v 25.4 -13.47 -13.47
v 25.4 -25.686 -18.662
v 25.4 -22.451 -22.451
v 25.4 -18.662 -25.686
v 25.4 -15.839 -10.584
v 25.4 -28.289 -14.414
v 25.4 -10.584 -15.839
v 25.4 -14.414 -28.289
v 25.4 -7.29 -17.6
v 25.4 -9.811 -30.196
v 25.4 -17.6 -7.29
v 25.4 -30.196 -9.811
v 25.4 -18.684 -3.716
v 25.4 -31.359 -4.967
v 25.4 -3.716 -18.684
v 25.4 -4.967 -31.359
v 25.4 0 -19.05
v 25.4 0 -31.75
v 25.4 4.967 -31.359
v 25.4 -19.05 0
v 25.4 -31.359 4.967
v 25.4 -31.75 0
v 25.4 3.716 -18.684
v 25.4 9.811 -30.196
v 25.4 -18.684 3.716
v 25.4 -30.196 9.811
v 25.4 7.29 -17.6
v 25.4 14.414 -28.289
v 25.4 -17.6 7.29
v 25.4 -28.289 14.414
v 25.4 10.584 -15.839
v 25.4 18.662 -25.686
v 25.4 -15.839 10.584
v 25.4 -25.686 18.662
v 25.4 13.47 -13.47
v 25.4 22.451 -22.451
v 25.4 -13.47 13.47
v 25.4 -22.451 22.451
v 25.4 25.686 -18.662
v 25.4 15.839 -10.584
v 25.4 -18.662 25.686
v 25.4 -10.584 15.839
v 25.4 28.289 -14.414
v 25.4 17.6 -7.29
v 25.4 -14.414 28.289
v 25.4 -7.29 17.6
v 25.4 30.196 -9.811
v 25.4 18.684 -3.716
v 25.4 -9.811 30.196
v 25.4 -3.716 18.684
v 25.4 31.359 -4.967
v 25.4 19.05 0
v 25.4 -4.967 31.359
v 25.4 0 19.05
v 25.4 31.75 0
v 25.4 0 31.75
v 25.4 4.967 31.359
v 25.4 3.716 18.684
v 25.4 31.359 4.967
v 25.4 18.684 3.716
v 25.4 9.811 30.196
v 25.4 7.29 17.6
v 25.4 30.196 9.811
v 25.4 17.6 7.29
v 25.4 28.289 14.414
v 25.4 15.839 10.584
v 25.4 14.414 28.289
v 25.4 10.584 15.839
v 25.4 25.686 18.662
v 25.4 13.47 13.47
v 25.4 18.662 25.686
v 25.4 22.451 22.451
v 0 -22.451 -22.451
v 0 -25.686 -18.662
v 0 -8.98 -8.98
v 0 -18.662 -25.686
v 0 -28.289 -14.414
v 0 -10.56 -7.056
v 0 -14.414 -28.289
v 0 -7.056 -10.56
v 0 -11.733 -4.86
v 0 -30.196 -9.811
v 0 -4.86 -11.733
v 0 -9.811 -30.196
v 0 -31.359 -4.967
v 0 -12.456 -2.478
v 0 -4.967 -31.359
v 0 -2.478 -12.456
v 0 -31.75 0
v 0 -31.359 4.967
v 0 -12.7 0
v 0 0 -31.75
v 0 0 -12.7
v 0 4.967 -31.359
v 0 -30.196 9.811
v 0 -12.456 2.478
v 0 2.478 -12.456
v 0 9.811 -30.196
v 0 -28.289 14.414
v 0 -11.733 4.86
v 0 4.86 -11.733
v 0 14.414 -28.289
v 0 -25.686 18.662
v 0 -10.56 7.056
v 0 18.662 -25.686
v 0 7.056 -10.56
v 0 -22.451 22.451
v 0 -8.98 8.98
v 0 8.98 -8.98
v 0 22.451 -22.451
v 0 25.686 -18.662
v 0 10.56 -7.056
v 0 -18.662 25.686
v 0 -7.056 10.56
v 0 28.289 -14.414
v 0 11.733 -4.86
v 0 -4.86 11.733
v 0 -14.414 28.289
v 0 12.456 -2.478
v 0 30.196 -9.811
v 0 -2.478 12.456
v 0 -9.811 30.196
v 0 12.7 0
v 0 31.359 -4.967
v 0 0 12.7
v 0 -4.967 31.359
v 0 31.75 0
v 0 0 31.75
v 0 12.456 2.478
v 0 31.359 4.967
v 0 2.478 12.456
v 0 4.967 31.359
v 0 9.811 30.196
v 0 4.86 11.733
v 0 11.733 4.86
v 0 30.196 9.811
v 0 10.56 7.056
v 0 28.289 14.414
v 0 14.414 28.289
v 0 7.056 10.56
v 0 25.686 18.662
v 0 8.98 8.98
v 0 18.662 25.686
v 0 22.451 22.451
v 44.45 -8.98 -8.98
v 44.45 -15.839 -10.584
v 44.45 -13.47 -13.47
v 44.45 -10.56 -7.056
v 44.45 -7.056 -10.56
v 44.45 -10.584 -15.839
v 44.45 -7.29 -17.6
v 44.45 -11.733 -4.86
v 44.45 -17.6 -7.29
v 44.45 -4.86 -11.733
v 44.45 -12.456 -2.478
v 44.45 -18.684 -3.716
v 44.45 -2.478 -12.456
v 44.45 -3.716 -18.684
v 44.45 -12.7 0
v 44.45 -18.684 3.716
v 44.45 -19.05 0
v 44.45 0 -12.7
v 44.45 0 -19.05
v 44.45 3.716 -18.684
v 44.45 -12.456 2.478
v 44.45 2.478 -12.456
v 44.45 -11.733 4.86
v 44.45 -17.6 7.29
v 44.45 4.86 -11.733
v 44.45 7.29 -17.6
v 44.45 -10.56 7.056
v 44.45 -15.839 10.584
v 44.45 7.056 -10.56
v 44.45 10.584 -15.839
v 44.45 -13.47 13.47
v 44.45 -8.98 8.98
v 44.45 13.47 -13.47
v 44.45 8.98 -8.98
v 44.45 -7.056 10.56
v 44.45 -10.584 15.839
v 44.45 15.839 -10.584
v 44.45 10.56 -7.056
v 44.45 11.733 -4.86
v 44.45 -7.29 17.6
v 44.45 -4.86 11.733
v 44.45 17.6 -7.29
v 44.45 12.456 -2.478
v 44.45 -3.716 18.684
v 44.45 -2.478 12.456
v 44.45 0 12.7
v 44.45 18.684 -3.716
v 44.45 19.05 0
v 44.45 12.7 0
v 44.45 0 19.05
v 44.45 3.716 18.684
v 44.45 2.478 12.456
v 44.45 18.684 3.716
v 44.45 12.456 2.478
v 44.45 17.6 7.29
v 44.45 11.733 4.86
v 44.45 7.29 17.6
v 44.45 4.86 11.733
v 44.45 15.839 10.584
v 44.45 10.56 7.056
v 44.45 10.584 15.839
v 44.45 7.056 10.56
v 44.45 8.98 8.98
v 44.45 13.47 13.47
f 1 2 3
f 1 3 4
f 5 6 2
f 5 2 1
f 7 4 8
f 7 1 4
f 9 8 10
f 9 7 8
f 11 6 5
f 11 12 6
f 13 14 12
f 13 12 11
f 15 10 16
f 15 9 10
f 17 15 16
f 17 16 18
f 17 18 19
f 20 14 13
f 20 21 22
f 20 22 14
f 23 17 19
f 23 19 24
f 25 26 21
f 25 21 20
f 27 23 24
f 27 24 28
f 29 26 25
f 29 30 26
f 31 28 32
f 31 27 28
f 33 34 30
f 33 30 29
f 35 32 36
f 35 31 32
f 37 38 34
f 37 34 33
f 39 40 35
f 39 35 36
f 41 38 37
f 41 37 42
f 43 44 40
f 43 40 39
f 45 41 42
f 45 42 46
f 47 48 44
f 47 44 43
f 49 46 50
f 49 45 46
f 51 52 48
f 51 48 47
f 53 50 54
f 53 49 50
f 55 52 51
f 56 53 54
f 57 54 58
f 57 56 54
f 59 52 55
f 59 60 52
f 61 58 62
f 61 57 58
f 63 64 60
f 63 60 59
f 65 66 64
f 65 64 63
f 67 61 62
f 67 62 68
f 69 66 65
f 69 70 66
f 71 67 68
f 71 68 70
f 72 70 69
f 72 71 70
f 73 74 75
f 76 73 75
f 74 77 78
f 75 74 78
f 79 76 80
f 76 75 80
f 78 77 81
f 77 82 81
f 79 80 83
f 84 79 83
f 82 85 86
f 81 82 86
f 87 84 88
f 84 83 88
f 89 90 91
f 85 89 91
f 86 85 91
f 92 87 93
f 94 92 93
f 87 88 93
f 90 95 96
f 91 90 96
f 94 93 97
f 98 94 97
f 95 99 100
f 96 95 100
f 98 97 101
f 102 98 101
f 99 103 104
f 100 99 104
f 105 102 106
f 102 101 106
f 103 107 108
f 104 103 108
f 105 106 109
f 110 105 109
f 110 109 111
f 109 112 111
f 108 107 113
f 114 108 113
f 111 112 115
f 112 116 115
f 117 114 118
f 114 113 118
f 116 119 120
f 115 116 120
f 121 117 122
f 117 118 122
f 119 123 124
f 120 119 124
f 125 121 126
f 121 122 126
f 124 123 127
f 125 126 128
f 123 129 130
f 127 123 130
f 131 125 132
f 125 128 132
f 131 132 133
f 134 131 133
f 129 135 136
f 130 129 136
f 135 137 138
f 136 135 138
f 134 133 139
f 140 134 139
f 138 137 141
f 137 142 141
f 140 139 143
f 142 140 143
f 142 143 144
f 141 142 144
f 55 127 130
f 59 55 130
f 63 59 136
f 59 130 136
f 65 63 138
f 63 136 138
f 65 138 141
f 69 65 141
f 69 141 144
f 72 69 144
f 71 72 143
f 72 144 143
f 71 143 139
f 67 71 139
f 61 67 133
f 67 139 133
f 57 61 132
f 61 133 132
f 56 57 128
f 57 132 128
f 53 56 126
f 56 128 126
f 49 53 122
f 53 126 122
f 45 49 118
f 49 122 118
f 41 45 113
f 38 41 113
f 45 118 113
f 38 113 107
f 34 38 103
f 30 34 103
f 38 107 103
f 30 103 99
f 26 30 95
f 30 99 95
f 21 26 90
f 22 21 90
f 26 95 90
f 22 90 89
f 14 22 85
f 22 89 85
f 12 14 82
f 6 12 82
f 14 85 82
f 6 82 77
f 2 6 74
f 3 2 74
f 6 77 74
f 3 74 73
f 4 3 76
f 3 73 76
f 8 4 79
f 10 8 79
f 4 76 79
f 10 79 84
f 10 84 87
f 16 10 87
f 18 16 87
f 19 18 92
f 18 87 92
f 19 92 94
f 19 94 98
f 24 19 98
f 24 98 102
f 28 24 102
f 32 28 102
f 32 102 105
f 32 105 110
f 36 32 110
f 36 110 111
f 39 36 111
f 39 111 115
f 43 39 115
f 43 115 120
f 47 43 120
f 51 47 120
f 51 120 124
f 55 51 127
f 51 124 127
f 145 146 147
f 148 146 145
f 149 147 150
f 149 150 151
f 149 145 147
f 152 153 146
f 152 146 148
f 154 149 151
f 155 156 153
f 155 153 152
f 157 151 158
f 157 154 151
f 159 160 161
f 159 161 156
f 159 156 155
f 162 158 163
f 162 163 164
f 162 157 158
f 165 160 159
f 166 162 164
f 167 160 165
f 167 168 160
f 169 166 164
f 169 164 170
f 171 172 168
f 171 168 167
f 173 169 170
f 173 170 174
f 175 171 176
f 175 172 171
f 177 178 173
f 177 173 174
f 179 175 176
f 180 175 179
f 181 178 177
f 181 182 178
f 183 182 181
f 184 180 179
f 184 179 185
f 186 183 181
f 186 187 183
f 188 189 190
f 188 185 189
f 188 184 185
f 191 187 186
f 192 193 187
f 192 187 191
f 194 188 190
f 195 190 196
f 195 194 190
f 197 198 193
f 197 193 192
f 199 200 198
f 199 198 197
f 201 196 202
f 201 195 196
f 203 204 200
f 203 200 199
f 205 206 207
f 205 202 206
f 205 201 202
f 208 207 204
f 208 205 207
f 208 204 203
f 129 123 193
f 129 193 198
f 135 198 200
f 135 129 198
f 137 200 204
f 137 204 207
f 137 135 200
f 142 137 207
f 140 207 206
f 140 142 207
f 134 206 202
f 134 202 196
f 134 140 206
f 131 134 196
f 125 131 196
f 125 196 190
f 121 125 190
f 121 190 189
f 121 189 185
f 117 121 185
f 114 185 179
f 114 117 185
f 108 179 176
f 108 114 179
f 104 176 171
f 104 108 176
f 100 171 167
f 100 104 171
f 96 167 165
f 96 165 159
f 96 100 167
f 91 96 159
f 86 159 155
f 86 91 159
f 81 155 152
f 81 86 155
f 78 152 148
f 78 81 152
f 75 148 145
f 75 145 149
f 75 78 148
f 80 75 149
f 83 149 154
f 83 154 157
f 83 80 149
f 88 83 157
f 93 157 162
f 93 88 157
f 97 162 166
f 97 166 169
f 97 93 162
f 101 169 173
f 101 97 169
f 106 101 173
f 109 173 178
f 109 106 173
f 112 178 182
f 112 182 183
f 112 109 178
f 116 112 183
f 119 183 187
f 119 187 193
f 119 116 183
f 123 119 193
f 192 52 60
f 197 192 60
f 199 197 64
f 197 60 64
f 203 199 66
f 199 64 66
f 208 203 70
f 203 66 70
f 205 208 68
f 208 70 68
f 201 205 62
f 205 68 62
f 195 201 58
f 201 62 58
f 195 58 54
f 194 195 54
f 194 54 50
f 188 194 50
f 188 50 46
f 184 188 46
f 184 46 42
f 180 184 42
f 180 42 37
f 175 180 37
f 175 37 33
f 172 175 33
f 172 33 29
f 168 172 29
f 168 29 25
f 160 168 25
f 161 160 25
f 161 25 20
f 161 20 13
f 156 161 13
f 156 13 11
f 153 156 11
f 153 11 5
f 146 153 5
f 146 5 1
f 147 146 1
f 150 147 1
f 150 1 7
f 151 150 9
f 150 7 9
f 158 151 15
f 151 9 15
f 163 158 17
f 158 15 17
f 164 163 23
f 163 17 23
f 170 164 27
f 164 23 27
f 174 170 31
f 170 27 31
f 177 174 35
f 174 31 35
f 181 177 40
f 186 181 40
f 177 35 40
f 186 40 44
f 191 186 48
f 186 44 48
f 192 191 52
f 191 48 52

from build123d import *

# Parameters (mm, degrees)
F0_R     = 31.75
F1_DEPTH = 25.4
F2_R     = 19.05
F3_DEPTH = 44.45
F4_R     = 12.7
F5_DEPTH = 44.45


with BuildPart() as f1:
    # F0 (on Right) → F1 (new body)
    with BuildSketch(Plane.YZ):
        Circle(F0_R)
    extrude(amount=F1_DEPTH)

    # F2 (on Right) → F3 (join)
    with BuildSketch(Plane.YZ):
        Circle(F2_R)
    extrude(amount=F3_DEPTH)

    # F4 (on Right) → F5 (cut)
    with BuildSketch(Plane.YZ):
        Circle(F4_R)
    extrude(amount=F5_DEPTH, mode=Mode.SUBTRACT)


solid = f1.part
